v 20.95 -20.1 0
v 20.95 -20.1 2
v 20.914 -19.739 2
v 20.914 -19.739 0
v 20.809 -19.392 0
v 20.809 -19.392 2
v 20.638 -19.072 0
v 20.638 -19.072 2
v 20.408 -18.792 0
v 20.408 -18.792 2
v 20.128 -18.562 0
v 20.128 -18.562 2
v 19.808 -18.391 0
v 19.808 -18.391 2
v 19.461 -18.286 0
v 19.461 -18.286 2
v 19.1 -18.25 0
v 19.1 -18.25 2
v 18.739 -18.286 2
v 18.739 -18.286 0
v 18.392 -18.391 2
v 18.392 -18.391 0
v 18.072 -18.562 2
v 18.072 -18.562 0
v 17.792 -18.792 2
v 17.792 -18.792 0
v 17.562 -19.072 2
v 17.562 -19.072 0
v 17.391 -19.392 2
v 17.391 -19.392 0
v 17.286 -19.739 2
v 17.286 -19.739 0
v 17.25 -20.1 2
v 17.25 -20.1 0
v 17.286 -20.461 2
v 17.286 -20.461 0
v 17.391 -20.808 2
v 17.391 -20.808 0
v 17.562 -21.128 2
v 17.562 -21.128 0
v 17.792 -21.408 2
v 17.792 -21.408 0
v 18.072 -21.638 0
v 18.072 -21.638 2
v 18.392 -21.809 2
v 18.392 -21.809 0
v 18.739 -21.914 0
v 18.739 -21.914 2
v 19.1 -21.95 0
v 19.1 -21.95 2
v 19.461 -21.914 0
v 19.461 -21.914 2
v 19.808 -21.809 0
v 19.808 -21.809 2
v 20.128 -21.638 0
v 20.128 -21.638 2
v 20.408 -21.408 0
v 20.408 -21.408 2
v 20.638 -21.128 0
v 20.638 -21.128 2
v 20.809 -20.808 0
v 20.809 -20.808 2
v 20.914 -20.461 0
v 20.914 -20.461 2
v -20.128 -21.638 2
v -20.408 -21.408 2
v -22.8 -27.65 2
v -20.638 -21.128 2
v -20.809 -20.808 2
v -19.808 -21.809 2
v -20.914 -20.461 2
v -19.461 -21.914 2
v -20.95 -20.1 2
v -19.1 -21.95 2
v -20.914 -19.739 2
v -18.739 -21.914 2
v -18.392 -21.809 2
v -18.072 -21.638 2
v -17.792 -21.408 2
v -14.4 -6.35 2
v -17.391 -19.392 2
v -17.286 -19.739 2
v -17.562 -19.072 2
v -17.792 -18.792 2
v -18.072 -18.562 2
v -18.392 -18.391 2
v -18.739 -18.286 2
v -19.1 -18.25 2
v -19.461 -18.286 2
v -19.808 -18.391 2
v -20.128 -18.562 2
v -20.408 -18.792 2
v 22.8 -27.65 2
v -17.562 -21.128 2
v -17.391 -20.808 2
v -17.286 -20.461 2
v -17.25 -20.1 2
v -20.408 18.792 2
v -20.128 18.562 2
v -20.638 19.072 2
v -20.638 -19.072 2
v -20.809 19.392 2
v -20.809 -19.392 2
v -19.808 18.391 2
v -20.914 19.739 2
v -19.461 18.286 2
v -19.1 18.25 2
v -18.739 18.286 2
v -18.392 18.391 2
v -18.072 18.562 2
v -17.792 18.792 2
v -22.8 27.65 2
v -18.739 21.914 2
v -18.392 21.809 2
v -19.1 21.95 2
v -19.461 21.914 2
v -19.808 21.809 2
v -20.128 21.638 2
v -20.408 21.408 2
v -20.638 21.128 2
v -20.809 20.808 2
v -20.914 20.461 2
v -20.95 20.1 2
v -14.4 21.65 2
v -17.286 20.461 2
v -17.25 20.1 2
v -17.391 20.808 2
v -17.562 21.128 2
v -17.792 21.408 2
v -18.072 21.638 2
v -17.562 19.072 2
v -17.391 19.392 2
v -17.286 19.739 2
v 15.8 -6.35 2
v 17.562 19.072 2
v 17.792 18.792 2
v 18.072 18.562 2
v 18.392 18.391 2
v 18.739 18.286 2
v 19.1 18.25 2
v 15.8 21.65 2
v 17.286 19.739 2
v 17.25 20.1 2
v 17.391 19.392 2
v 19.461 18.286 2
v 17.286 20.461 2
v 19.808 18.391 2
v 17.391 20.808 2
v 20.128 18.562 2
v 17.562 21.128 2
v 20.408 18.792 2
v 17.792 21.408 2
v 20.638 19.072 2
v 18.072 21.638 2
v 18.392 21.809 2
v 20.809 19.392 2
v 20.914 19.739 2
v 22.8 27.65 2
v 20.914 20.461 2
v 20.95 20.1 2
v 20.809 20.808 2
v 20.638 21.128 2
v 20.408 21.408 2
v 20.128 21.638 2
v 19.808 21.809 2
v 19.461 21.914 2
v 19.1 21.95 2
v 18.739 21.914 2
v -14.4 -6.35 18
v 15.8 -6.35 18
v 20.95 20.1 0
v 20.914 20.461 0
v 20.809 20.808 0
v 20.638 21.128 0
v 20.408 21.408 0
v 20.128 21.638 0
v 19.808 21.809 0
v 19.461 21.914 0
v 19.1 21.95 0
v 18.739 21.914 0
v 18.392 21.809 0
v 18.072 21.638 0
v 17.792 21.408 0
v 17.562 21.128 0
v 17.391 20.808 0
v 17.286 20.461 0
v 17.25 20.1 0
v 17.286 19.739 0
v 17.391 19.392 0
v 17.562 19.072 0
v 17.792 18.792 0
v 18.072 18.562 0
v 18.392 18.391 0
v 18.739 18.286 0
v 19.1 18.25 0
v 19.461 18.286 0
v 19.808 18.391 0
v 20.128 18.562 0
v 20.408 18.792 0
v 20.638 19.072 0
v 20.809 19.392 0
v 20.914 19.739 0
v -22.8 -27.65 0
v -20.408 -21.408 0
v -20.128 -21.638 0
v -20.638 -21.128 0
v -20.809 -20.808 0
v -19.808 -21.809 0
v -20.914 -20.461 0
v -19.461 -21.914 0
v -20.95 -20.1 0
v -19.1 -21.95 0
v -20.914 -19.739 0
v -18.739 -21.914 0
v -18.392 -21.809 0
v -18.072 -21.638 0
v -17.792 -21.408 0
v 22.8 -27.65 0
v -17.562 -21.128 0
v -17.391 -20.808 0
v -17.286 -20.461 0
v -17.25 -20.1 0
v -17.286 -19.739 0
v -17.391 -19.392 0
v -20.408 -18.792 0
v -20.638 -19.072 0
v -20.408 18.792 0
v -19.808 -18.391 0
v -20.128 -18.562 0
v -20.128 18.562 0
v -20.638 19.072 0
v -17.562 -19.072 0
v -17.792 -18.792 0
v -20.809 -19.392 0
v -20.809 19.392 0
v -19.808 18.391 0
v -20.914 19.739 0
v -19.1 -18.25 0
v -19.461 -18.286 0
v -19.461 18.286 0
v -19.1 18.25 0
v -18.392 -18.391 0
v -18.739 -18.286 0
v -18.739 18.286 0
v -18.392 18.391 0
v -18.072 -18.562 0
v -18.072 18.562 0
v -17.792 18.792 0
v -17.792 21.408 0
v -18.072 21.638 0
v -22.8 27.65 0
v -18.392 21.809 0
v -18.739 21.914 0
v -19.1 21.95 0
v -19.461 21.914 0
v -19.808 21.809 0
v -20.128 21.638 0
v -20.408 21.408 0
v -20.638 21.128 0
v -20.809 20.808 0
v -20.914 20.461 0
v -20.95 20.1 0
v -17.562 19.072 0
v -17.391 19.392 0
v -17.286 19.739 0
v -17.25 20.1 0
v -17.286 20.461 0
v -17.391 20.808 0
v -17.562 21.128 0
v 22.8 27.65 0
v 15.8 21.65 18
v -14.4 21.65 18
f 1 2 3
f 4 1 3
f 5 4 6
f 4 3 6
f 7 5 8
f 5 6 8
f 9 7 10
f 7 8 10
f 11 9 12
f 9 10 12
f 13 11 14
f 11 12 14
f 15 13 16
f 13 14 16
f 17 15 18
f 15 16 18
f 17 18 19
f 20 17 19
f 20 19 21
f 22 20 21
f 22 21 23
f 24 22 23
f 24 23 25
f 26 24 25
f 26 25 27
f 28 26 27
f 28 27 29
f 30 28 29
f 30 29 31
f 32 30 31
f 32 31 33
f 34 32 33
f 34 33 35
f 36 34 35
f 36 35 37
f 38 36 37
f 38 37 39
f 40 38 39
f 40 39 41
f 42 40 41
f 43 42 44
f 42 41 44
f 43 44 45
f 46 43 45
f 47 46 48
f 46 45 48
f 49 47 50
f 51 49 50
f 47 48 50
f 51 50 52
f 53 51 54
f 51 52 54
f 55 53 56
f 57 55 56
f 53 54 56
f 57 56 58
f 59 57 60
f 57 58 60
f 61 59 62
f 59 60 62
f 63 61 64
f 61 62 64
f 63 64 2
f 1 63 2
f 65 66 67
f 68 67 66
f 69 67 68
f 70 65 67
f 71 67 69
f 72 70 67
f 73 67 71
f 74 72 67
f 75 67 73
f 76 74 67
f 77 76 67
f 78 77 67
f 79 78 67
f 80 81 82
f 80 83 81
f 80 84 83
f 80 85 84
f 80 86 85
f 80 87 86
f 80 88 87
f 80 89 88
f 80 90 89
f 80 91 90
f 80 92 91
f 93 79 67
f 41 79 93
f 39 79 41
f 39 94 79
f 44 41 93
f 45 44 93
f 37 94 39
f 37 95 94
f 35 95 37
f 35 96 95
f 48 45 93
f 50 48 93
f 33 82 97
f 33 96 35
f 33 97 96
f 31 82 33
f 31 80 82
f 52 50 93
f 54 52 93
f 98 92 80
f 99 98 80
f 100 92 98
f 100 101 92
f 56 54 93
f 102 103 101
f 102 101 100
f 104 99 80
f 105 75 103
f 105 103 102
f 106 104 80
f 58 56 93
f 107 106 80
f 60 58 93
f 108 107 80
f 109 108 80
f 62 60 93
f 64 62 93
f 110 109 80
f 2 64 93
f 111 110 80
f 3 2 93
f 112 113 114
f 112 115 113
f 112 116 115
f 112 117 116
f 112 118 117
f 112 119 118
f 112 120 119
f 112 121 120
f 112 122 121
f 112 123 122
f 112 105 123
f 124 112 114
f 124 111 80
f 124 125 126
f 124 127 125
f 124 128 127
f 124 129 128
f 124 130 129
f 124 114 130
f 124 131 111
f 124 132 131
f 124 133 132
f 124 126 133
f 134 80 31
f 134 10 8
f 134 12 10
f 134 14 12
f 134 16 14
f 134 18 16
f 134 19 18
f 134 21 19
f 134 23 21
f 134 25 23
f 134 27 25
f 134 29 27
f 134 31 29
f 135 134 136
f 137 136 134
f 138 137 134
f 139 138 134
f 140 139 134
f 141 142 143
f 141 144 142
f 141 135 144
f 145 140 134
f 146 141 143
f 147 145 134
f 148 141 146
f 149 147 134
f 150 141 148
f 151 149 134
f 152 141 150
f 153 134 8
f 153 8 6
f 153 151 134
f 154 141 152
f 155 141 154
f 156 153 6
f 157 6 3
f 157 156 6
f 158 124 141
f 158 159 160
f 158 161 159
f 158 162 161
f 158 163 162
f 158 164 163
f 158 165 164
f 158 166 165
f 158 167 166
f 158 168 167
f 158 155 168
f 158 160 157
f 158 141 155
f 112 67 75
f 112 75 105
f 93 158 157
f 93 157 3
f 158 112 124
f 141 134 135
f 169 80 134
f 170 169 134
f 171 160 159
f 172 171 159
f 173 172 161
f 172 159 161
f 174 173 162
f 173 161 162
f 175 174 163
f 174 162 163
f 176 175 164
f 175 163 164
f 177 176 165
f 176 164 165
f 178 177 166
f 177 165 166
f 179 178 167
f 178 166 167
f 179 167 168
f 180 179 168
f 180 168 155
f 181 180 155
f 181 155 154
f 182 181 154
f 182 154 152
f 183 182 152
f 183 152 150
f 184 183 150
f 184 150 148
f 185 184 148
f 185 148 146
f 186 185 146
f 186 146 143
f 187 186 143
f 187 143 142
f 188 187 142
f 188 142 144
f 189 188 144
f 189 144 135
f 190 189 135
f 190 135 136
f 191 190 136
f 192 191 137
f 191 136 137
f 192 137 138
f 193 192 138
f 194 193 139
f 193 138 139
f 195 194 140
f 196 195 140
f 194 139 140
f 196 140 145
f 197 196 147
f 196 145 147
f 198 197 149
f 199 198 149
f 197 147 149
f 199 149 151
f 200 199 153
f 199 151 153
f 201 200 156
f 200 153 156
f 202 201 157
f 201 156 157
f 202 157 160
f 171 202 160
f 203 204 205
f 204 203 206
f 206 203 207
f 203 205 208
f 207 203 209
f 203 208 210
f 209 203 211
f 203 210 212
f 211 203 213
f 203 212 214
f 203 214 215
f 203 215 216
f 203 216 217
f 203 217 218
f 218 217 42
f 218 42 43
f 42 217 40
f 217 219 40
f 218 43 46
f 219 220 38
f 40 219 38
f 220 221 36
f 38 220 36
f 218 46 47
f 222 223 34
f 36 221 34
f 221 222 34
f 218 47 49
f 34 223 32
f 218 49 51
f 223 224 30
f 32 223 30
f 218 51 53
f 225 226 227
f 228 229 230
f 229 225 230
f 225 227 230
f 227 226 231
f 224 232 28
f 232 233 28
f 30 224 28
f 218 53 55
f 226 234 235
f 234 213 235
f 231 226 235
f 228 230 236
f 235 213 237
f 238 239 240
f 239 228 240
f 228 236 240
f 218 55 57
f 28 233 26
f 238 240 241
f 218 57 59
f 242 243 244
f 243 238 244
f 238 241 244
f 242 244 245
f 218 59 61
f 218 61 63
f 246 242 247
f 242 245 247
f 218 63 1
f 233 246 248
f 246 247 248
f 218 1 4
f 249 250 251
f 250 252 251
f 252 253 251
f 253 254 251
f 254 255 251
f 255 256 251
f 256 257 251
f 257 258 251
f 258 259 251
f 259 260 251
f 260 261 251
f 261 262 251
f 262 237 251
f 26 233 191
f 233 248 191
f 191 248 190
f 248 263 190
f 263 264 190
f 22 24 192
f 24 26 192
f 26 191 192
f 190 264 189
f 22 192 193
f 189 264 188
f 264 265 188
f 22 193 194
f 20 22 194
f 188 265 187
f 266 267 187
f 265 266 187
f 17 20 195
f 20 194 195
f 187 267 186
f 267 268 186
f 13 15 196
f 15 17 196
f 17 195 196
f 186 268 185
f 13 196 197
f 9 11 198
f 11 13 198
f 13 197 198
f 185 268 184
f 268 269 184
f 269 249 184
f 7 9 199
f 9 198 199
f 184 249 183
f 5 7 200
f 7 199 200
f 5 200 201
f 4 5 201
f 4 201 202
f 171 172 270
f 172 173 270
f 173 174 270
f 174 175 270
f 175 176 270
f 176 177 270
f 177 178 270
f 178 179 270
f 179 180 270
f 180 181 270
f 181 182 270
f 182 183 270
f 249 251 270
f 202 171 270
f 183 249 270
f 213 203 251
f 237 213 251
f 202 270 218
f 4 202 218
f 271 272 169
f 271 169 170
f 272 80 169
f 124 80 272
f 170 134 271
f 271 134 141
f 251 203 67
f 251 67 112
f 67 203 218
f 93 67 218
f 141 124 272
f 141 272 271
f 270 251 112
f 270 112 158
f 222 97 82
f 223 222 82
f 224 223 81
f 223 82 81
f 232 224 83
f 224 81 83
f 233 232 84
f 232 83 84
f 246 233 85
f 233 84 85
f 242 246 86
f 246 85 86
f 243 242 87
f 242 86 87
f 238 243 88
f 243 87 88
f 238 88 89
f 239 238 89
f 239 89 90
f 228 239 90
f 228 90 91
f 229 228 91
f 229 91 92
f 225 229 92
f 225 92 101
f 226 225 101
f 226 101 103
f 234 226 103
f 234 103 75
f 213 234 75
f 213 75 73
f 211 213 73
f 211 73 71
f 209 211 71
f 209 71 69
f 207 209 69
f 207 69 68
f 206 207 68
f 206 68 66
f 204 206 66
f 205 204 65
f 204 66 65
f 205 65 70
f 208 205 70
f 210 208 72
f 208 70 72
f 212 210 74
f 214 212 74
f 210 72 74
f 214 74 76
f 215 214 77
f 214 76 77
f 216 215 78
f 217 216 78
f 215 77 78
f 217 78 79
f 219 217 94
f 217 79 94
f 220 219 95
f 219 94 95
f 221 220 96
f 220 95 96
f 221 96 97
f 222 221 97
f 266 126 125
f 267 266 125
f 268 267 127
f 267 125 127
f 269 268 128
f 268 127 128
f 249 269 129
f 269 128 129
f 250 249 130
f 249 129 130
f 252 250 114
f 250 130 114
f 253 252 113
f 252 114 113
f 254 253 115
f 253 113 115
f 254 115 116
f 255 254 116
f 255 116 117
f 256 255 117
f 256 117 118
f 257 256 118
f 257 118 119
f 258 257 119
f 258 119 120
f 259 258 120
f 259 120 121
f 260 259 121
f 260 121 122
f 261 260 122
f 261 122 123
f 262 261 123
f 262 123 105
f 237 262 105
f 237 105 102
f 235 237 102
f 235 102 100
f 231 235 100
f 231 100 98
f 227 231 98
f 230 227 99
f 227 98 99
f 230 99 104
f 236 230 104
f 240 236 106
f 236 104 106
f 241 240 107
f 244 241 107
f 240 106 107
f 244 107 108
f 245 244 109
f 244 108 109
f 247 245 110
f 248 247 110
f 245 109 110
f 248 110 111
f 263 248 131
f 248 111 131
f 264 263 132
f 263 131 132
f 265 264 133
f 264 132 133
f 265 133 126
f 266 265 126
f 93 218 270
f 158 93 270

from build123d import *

# Parameters (mm, degrees)
F0_W     = 45.6
F0_H     = 55.3
F1_DEPTH = 2
F2_R     = 1.85
F3_DEPTH = 25
F4_W     = 30.2
F4_H     = 28
F5_DEPTH = 16


with BuildPart() as f1:
    # F0 (on Top) → F1 (new body)
    with BuildSketch(Plane.XY):
        Rectangle(F0_W, F0_H)
    extrude(amount=F1_DEPTH)

    # F2 (on face) → F3 (cut)
    with BuildSketch(Plane.XY.offset(2)):
        with Locations((-19.1, 20.1)):
            Circle(F2_R)
        with Locations((19.1, 20.1)):
            Circle(F2_R)
        with Locations((-19.1, -20.1)):
            Circle(F2_R)
        with Locations((19.1, -20.1)):
            Circle(F2_R)
    extrude(amount=-F3_DEPTH, mode=Mode.SUBTRACT)

    # F4 (on face) → F5 (join)
    with BuildSketch(Plane.XY.offset(2)):
        with Locations((0.7, 7.65)):
            Rectangle(F4_W, F4_H)
    extrude(amount=F5_DEPTH)


solid = f1.part
